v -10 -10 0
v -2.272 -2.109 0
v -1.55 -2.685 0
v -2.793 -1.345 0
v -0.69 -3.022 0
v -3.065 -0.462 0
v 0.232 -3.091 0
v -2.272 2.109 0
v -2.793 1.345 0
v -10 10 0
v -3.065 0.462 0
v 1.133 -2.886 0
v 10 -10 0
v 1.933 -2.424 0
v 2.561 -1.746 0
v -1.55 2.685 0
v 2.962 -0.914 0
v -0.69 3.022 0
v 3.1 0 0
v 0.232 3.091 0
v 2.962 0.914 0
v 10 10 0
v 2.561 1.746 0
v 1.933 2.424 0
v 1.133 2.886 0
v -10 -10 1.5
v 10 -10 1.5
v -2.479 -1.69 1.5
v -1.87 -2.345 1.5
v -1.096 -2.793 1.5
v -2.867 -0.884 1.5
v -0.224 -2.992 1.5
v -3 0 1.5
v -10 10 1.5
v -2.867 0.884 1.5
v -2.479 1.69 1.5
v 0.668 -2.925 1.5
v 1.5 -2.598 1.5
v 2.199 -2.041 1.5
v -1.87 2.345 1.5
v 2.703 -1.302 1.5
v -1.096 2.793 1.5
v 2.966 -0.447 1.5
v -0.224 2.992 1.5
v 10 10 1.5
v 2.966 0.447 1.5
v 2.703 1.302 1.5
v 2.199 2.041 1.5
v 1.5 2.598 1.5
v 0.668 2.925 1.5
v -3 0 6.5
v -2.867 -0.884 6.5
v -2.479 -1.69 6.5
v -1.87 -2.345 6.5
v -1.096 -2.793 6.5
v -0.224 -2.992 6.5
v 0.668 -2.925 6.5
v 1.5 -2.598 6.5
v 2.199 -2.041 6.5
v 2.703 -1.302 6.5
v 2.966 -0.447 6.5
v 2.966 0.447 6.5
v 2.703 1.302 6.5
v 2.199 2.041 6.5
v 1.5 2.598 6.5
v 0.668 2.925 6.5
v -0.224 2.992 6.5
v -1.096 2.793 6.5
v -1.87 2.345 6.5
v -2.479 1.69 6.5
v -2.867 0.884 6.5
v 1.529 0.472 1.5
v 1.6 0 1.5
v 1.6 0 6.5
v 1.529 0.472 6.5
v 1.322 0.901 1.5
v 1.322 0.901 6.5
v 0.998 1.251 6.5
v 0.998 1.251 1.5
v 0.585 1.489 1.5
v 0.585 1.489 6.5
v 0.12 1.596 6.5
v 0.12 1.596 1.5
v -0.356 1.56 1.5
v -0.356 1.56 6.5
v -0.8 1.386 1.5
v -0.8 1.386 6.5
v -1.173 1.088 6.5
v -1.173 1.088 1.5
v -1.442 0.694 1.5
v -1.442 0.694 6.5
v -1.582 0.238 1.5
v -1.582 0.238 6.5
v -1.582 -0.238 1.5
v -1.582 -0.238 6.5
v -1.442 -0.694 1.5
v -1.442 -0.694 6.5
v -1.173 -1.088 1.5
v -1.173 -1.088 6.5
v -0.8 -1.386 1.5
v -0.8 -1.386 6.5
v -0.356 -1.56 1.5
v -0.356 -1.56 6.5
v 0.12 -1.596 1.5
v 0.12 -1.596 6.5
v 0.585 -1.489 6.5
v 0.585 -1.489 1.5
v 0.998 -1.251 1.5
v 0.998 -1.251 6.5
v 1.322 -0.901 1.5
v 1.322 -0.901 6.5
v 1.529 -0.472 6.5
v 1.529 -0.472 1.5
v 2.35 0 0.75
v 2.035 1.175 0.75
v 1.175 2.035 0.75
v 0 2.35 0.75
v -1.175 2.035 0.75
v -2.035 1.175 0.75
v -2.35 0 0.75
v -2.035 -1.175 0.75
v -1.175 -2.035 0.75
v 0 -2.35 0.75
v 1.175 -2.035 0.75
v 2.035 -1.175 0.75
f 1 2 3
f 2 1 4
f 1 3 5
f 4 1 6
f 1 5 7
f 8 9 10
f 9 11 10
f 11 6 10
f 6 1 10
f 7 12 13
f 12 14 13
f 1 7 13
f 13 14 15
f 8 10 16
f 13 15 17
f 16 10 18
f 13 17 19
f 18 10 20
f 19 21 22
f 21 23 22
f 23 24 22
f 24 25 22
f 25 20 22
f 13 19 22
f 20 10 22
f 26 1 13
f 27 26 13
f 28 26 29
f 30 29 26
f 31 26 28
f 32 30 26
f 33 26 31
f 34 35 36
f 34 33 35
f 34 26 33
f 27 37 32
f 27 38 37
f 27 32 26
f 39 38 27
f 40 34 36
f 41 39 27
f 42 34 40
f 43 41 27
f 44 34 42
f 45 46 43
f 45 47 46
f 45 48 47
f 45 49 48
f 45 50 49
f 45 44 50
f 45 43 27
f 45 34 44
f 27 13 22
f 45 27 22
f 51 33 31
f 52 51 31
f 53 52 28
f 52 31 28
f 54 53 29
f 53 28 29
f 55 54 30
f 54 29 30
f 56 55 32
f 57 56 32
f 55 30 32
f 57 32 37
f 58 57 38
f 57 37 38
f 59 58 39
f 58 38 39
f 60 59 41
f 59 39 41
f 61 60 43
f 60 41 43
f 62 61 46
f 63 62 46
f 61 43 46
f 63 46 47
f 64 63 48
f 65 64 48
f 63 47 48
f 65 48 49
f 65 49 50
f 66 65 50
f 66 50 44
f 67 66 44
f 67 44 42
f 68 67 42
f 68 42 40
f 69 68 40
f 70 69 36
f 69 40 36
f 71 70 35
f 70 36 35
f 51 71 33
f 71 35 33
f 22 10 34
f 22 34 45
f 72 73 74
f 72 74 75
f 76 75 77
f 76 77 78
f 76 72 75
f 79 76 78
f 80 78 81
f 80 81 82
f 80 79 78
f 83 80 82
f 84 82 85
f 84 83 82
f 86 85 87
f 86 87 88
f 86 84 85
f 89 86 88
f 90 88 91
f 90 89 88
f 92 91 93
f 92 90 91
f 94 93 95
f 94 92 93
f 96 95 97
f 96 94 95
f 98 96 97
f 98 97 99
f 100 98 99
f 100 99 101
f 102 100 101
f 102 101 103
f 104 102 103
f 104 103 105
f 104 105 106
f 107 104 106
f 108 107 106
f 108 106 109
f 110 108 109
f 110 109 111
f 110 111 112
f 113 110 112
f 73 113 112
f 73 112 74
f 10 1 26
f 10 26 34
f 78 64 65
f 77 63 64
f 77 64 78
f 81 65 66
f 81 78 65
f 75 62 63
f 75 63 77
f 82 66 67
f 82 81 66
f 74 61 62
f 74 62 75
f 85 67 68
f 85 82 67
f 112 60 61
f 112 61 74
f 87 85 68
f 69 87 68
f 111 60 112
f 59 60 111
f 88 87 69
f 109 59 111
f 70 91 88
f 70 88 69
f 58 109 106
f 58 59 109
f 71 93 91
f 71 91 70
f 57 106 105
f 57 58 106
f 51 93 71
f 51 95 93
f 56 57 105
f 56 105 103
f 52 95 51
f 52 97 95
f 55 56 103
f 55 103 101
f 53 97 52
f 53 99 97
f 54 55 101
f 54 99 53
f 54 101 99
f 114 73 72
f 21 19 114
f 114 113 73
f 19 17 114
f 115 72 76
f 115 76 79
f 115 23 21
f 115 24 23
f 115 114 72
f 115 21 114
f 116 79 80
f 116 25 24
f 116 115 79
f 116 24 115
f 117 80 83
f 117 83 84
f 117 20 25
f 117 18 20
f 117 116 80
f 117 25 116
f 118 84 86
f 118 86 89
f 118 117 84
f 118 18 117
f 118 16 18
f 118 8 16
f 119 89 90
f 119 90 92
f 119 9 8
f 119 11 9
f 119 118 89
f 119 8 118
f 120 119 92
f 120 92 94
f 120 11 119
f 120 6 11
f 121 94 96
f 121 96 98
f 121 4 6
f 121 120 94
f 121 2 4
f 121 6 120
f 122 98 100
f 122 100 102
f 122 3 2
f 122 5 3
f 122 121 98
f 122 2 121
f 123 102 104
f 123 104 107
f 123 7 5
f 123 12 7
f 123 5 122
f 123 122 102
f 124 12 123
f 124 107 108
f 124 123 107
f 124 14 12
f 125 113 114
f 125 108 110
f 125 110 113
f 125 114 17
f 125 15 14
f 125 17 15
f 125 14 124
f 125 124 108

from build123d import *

# Parameters (mm, degrees)
SKETCH_2_W        = 20
SKETCH_2_H        = 20
SKETCH_2_R        = 1.6
EXTRUDE_433_DEPTH = 1.5
SKETCH_3_R        = 3
SKETCH_3_R_2      = 1.6
EXTRUDE_659_DEPTH = 5
CHAMFER_1_SIZE    = 1.5


with BuildPart() as part:
    # Эскиз2 → Extrude 433 (new body)
    with BuildSketch(Plane.XY):
        Rectangle(SKETCH_2_W, SKETCH_2_H)
        Circle(SKETCH_2_R, mode=Mode.SUBTRACT)
    extrude(amount=EXTRUDE_433_DEPTH)

    # Эскиз3 → Extrude 659 (add)
    with BuildSketch(Plane.XY.offset(1.5)):
        with Locations(Location((0, 0, 0), (0, 0, 180))):
            Circle(SKETCH_3_R)
        Circle(SKETCH_3_R_2, mode=Mode.SUBTRACT)
    extrude(amount=EXTRUDE_659_DEPTH)

    # Фаска1
    chamfer_1_edges = [part.edges().sort_by_distance(p)[0] for p in [
        (-1.6, 0, 0),
    ]]
    chamfer(chamfer_1_edges, length=CHAMFER_1_SIZE)


solid = part.part
